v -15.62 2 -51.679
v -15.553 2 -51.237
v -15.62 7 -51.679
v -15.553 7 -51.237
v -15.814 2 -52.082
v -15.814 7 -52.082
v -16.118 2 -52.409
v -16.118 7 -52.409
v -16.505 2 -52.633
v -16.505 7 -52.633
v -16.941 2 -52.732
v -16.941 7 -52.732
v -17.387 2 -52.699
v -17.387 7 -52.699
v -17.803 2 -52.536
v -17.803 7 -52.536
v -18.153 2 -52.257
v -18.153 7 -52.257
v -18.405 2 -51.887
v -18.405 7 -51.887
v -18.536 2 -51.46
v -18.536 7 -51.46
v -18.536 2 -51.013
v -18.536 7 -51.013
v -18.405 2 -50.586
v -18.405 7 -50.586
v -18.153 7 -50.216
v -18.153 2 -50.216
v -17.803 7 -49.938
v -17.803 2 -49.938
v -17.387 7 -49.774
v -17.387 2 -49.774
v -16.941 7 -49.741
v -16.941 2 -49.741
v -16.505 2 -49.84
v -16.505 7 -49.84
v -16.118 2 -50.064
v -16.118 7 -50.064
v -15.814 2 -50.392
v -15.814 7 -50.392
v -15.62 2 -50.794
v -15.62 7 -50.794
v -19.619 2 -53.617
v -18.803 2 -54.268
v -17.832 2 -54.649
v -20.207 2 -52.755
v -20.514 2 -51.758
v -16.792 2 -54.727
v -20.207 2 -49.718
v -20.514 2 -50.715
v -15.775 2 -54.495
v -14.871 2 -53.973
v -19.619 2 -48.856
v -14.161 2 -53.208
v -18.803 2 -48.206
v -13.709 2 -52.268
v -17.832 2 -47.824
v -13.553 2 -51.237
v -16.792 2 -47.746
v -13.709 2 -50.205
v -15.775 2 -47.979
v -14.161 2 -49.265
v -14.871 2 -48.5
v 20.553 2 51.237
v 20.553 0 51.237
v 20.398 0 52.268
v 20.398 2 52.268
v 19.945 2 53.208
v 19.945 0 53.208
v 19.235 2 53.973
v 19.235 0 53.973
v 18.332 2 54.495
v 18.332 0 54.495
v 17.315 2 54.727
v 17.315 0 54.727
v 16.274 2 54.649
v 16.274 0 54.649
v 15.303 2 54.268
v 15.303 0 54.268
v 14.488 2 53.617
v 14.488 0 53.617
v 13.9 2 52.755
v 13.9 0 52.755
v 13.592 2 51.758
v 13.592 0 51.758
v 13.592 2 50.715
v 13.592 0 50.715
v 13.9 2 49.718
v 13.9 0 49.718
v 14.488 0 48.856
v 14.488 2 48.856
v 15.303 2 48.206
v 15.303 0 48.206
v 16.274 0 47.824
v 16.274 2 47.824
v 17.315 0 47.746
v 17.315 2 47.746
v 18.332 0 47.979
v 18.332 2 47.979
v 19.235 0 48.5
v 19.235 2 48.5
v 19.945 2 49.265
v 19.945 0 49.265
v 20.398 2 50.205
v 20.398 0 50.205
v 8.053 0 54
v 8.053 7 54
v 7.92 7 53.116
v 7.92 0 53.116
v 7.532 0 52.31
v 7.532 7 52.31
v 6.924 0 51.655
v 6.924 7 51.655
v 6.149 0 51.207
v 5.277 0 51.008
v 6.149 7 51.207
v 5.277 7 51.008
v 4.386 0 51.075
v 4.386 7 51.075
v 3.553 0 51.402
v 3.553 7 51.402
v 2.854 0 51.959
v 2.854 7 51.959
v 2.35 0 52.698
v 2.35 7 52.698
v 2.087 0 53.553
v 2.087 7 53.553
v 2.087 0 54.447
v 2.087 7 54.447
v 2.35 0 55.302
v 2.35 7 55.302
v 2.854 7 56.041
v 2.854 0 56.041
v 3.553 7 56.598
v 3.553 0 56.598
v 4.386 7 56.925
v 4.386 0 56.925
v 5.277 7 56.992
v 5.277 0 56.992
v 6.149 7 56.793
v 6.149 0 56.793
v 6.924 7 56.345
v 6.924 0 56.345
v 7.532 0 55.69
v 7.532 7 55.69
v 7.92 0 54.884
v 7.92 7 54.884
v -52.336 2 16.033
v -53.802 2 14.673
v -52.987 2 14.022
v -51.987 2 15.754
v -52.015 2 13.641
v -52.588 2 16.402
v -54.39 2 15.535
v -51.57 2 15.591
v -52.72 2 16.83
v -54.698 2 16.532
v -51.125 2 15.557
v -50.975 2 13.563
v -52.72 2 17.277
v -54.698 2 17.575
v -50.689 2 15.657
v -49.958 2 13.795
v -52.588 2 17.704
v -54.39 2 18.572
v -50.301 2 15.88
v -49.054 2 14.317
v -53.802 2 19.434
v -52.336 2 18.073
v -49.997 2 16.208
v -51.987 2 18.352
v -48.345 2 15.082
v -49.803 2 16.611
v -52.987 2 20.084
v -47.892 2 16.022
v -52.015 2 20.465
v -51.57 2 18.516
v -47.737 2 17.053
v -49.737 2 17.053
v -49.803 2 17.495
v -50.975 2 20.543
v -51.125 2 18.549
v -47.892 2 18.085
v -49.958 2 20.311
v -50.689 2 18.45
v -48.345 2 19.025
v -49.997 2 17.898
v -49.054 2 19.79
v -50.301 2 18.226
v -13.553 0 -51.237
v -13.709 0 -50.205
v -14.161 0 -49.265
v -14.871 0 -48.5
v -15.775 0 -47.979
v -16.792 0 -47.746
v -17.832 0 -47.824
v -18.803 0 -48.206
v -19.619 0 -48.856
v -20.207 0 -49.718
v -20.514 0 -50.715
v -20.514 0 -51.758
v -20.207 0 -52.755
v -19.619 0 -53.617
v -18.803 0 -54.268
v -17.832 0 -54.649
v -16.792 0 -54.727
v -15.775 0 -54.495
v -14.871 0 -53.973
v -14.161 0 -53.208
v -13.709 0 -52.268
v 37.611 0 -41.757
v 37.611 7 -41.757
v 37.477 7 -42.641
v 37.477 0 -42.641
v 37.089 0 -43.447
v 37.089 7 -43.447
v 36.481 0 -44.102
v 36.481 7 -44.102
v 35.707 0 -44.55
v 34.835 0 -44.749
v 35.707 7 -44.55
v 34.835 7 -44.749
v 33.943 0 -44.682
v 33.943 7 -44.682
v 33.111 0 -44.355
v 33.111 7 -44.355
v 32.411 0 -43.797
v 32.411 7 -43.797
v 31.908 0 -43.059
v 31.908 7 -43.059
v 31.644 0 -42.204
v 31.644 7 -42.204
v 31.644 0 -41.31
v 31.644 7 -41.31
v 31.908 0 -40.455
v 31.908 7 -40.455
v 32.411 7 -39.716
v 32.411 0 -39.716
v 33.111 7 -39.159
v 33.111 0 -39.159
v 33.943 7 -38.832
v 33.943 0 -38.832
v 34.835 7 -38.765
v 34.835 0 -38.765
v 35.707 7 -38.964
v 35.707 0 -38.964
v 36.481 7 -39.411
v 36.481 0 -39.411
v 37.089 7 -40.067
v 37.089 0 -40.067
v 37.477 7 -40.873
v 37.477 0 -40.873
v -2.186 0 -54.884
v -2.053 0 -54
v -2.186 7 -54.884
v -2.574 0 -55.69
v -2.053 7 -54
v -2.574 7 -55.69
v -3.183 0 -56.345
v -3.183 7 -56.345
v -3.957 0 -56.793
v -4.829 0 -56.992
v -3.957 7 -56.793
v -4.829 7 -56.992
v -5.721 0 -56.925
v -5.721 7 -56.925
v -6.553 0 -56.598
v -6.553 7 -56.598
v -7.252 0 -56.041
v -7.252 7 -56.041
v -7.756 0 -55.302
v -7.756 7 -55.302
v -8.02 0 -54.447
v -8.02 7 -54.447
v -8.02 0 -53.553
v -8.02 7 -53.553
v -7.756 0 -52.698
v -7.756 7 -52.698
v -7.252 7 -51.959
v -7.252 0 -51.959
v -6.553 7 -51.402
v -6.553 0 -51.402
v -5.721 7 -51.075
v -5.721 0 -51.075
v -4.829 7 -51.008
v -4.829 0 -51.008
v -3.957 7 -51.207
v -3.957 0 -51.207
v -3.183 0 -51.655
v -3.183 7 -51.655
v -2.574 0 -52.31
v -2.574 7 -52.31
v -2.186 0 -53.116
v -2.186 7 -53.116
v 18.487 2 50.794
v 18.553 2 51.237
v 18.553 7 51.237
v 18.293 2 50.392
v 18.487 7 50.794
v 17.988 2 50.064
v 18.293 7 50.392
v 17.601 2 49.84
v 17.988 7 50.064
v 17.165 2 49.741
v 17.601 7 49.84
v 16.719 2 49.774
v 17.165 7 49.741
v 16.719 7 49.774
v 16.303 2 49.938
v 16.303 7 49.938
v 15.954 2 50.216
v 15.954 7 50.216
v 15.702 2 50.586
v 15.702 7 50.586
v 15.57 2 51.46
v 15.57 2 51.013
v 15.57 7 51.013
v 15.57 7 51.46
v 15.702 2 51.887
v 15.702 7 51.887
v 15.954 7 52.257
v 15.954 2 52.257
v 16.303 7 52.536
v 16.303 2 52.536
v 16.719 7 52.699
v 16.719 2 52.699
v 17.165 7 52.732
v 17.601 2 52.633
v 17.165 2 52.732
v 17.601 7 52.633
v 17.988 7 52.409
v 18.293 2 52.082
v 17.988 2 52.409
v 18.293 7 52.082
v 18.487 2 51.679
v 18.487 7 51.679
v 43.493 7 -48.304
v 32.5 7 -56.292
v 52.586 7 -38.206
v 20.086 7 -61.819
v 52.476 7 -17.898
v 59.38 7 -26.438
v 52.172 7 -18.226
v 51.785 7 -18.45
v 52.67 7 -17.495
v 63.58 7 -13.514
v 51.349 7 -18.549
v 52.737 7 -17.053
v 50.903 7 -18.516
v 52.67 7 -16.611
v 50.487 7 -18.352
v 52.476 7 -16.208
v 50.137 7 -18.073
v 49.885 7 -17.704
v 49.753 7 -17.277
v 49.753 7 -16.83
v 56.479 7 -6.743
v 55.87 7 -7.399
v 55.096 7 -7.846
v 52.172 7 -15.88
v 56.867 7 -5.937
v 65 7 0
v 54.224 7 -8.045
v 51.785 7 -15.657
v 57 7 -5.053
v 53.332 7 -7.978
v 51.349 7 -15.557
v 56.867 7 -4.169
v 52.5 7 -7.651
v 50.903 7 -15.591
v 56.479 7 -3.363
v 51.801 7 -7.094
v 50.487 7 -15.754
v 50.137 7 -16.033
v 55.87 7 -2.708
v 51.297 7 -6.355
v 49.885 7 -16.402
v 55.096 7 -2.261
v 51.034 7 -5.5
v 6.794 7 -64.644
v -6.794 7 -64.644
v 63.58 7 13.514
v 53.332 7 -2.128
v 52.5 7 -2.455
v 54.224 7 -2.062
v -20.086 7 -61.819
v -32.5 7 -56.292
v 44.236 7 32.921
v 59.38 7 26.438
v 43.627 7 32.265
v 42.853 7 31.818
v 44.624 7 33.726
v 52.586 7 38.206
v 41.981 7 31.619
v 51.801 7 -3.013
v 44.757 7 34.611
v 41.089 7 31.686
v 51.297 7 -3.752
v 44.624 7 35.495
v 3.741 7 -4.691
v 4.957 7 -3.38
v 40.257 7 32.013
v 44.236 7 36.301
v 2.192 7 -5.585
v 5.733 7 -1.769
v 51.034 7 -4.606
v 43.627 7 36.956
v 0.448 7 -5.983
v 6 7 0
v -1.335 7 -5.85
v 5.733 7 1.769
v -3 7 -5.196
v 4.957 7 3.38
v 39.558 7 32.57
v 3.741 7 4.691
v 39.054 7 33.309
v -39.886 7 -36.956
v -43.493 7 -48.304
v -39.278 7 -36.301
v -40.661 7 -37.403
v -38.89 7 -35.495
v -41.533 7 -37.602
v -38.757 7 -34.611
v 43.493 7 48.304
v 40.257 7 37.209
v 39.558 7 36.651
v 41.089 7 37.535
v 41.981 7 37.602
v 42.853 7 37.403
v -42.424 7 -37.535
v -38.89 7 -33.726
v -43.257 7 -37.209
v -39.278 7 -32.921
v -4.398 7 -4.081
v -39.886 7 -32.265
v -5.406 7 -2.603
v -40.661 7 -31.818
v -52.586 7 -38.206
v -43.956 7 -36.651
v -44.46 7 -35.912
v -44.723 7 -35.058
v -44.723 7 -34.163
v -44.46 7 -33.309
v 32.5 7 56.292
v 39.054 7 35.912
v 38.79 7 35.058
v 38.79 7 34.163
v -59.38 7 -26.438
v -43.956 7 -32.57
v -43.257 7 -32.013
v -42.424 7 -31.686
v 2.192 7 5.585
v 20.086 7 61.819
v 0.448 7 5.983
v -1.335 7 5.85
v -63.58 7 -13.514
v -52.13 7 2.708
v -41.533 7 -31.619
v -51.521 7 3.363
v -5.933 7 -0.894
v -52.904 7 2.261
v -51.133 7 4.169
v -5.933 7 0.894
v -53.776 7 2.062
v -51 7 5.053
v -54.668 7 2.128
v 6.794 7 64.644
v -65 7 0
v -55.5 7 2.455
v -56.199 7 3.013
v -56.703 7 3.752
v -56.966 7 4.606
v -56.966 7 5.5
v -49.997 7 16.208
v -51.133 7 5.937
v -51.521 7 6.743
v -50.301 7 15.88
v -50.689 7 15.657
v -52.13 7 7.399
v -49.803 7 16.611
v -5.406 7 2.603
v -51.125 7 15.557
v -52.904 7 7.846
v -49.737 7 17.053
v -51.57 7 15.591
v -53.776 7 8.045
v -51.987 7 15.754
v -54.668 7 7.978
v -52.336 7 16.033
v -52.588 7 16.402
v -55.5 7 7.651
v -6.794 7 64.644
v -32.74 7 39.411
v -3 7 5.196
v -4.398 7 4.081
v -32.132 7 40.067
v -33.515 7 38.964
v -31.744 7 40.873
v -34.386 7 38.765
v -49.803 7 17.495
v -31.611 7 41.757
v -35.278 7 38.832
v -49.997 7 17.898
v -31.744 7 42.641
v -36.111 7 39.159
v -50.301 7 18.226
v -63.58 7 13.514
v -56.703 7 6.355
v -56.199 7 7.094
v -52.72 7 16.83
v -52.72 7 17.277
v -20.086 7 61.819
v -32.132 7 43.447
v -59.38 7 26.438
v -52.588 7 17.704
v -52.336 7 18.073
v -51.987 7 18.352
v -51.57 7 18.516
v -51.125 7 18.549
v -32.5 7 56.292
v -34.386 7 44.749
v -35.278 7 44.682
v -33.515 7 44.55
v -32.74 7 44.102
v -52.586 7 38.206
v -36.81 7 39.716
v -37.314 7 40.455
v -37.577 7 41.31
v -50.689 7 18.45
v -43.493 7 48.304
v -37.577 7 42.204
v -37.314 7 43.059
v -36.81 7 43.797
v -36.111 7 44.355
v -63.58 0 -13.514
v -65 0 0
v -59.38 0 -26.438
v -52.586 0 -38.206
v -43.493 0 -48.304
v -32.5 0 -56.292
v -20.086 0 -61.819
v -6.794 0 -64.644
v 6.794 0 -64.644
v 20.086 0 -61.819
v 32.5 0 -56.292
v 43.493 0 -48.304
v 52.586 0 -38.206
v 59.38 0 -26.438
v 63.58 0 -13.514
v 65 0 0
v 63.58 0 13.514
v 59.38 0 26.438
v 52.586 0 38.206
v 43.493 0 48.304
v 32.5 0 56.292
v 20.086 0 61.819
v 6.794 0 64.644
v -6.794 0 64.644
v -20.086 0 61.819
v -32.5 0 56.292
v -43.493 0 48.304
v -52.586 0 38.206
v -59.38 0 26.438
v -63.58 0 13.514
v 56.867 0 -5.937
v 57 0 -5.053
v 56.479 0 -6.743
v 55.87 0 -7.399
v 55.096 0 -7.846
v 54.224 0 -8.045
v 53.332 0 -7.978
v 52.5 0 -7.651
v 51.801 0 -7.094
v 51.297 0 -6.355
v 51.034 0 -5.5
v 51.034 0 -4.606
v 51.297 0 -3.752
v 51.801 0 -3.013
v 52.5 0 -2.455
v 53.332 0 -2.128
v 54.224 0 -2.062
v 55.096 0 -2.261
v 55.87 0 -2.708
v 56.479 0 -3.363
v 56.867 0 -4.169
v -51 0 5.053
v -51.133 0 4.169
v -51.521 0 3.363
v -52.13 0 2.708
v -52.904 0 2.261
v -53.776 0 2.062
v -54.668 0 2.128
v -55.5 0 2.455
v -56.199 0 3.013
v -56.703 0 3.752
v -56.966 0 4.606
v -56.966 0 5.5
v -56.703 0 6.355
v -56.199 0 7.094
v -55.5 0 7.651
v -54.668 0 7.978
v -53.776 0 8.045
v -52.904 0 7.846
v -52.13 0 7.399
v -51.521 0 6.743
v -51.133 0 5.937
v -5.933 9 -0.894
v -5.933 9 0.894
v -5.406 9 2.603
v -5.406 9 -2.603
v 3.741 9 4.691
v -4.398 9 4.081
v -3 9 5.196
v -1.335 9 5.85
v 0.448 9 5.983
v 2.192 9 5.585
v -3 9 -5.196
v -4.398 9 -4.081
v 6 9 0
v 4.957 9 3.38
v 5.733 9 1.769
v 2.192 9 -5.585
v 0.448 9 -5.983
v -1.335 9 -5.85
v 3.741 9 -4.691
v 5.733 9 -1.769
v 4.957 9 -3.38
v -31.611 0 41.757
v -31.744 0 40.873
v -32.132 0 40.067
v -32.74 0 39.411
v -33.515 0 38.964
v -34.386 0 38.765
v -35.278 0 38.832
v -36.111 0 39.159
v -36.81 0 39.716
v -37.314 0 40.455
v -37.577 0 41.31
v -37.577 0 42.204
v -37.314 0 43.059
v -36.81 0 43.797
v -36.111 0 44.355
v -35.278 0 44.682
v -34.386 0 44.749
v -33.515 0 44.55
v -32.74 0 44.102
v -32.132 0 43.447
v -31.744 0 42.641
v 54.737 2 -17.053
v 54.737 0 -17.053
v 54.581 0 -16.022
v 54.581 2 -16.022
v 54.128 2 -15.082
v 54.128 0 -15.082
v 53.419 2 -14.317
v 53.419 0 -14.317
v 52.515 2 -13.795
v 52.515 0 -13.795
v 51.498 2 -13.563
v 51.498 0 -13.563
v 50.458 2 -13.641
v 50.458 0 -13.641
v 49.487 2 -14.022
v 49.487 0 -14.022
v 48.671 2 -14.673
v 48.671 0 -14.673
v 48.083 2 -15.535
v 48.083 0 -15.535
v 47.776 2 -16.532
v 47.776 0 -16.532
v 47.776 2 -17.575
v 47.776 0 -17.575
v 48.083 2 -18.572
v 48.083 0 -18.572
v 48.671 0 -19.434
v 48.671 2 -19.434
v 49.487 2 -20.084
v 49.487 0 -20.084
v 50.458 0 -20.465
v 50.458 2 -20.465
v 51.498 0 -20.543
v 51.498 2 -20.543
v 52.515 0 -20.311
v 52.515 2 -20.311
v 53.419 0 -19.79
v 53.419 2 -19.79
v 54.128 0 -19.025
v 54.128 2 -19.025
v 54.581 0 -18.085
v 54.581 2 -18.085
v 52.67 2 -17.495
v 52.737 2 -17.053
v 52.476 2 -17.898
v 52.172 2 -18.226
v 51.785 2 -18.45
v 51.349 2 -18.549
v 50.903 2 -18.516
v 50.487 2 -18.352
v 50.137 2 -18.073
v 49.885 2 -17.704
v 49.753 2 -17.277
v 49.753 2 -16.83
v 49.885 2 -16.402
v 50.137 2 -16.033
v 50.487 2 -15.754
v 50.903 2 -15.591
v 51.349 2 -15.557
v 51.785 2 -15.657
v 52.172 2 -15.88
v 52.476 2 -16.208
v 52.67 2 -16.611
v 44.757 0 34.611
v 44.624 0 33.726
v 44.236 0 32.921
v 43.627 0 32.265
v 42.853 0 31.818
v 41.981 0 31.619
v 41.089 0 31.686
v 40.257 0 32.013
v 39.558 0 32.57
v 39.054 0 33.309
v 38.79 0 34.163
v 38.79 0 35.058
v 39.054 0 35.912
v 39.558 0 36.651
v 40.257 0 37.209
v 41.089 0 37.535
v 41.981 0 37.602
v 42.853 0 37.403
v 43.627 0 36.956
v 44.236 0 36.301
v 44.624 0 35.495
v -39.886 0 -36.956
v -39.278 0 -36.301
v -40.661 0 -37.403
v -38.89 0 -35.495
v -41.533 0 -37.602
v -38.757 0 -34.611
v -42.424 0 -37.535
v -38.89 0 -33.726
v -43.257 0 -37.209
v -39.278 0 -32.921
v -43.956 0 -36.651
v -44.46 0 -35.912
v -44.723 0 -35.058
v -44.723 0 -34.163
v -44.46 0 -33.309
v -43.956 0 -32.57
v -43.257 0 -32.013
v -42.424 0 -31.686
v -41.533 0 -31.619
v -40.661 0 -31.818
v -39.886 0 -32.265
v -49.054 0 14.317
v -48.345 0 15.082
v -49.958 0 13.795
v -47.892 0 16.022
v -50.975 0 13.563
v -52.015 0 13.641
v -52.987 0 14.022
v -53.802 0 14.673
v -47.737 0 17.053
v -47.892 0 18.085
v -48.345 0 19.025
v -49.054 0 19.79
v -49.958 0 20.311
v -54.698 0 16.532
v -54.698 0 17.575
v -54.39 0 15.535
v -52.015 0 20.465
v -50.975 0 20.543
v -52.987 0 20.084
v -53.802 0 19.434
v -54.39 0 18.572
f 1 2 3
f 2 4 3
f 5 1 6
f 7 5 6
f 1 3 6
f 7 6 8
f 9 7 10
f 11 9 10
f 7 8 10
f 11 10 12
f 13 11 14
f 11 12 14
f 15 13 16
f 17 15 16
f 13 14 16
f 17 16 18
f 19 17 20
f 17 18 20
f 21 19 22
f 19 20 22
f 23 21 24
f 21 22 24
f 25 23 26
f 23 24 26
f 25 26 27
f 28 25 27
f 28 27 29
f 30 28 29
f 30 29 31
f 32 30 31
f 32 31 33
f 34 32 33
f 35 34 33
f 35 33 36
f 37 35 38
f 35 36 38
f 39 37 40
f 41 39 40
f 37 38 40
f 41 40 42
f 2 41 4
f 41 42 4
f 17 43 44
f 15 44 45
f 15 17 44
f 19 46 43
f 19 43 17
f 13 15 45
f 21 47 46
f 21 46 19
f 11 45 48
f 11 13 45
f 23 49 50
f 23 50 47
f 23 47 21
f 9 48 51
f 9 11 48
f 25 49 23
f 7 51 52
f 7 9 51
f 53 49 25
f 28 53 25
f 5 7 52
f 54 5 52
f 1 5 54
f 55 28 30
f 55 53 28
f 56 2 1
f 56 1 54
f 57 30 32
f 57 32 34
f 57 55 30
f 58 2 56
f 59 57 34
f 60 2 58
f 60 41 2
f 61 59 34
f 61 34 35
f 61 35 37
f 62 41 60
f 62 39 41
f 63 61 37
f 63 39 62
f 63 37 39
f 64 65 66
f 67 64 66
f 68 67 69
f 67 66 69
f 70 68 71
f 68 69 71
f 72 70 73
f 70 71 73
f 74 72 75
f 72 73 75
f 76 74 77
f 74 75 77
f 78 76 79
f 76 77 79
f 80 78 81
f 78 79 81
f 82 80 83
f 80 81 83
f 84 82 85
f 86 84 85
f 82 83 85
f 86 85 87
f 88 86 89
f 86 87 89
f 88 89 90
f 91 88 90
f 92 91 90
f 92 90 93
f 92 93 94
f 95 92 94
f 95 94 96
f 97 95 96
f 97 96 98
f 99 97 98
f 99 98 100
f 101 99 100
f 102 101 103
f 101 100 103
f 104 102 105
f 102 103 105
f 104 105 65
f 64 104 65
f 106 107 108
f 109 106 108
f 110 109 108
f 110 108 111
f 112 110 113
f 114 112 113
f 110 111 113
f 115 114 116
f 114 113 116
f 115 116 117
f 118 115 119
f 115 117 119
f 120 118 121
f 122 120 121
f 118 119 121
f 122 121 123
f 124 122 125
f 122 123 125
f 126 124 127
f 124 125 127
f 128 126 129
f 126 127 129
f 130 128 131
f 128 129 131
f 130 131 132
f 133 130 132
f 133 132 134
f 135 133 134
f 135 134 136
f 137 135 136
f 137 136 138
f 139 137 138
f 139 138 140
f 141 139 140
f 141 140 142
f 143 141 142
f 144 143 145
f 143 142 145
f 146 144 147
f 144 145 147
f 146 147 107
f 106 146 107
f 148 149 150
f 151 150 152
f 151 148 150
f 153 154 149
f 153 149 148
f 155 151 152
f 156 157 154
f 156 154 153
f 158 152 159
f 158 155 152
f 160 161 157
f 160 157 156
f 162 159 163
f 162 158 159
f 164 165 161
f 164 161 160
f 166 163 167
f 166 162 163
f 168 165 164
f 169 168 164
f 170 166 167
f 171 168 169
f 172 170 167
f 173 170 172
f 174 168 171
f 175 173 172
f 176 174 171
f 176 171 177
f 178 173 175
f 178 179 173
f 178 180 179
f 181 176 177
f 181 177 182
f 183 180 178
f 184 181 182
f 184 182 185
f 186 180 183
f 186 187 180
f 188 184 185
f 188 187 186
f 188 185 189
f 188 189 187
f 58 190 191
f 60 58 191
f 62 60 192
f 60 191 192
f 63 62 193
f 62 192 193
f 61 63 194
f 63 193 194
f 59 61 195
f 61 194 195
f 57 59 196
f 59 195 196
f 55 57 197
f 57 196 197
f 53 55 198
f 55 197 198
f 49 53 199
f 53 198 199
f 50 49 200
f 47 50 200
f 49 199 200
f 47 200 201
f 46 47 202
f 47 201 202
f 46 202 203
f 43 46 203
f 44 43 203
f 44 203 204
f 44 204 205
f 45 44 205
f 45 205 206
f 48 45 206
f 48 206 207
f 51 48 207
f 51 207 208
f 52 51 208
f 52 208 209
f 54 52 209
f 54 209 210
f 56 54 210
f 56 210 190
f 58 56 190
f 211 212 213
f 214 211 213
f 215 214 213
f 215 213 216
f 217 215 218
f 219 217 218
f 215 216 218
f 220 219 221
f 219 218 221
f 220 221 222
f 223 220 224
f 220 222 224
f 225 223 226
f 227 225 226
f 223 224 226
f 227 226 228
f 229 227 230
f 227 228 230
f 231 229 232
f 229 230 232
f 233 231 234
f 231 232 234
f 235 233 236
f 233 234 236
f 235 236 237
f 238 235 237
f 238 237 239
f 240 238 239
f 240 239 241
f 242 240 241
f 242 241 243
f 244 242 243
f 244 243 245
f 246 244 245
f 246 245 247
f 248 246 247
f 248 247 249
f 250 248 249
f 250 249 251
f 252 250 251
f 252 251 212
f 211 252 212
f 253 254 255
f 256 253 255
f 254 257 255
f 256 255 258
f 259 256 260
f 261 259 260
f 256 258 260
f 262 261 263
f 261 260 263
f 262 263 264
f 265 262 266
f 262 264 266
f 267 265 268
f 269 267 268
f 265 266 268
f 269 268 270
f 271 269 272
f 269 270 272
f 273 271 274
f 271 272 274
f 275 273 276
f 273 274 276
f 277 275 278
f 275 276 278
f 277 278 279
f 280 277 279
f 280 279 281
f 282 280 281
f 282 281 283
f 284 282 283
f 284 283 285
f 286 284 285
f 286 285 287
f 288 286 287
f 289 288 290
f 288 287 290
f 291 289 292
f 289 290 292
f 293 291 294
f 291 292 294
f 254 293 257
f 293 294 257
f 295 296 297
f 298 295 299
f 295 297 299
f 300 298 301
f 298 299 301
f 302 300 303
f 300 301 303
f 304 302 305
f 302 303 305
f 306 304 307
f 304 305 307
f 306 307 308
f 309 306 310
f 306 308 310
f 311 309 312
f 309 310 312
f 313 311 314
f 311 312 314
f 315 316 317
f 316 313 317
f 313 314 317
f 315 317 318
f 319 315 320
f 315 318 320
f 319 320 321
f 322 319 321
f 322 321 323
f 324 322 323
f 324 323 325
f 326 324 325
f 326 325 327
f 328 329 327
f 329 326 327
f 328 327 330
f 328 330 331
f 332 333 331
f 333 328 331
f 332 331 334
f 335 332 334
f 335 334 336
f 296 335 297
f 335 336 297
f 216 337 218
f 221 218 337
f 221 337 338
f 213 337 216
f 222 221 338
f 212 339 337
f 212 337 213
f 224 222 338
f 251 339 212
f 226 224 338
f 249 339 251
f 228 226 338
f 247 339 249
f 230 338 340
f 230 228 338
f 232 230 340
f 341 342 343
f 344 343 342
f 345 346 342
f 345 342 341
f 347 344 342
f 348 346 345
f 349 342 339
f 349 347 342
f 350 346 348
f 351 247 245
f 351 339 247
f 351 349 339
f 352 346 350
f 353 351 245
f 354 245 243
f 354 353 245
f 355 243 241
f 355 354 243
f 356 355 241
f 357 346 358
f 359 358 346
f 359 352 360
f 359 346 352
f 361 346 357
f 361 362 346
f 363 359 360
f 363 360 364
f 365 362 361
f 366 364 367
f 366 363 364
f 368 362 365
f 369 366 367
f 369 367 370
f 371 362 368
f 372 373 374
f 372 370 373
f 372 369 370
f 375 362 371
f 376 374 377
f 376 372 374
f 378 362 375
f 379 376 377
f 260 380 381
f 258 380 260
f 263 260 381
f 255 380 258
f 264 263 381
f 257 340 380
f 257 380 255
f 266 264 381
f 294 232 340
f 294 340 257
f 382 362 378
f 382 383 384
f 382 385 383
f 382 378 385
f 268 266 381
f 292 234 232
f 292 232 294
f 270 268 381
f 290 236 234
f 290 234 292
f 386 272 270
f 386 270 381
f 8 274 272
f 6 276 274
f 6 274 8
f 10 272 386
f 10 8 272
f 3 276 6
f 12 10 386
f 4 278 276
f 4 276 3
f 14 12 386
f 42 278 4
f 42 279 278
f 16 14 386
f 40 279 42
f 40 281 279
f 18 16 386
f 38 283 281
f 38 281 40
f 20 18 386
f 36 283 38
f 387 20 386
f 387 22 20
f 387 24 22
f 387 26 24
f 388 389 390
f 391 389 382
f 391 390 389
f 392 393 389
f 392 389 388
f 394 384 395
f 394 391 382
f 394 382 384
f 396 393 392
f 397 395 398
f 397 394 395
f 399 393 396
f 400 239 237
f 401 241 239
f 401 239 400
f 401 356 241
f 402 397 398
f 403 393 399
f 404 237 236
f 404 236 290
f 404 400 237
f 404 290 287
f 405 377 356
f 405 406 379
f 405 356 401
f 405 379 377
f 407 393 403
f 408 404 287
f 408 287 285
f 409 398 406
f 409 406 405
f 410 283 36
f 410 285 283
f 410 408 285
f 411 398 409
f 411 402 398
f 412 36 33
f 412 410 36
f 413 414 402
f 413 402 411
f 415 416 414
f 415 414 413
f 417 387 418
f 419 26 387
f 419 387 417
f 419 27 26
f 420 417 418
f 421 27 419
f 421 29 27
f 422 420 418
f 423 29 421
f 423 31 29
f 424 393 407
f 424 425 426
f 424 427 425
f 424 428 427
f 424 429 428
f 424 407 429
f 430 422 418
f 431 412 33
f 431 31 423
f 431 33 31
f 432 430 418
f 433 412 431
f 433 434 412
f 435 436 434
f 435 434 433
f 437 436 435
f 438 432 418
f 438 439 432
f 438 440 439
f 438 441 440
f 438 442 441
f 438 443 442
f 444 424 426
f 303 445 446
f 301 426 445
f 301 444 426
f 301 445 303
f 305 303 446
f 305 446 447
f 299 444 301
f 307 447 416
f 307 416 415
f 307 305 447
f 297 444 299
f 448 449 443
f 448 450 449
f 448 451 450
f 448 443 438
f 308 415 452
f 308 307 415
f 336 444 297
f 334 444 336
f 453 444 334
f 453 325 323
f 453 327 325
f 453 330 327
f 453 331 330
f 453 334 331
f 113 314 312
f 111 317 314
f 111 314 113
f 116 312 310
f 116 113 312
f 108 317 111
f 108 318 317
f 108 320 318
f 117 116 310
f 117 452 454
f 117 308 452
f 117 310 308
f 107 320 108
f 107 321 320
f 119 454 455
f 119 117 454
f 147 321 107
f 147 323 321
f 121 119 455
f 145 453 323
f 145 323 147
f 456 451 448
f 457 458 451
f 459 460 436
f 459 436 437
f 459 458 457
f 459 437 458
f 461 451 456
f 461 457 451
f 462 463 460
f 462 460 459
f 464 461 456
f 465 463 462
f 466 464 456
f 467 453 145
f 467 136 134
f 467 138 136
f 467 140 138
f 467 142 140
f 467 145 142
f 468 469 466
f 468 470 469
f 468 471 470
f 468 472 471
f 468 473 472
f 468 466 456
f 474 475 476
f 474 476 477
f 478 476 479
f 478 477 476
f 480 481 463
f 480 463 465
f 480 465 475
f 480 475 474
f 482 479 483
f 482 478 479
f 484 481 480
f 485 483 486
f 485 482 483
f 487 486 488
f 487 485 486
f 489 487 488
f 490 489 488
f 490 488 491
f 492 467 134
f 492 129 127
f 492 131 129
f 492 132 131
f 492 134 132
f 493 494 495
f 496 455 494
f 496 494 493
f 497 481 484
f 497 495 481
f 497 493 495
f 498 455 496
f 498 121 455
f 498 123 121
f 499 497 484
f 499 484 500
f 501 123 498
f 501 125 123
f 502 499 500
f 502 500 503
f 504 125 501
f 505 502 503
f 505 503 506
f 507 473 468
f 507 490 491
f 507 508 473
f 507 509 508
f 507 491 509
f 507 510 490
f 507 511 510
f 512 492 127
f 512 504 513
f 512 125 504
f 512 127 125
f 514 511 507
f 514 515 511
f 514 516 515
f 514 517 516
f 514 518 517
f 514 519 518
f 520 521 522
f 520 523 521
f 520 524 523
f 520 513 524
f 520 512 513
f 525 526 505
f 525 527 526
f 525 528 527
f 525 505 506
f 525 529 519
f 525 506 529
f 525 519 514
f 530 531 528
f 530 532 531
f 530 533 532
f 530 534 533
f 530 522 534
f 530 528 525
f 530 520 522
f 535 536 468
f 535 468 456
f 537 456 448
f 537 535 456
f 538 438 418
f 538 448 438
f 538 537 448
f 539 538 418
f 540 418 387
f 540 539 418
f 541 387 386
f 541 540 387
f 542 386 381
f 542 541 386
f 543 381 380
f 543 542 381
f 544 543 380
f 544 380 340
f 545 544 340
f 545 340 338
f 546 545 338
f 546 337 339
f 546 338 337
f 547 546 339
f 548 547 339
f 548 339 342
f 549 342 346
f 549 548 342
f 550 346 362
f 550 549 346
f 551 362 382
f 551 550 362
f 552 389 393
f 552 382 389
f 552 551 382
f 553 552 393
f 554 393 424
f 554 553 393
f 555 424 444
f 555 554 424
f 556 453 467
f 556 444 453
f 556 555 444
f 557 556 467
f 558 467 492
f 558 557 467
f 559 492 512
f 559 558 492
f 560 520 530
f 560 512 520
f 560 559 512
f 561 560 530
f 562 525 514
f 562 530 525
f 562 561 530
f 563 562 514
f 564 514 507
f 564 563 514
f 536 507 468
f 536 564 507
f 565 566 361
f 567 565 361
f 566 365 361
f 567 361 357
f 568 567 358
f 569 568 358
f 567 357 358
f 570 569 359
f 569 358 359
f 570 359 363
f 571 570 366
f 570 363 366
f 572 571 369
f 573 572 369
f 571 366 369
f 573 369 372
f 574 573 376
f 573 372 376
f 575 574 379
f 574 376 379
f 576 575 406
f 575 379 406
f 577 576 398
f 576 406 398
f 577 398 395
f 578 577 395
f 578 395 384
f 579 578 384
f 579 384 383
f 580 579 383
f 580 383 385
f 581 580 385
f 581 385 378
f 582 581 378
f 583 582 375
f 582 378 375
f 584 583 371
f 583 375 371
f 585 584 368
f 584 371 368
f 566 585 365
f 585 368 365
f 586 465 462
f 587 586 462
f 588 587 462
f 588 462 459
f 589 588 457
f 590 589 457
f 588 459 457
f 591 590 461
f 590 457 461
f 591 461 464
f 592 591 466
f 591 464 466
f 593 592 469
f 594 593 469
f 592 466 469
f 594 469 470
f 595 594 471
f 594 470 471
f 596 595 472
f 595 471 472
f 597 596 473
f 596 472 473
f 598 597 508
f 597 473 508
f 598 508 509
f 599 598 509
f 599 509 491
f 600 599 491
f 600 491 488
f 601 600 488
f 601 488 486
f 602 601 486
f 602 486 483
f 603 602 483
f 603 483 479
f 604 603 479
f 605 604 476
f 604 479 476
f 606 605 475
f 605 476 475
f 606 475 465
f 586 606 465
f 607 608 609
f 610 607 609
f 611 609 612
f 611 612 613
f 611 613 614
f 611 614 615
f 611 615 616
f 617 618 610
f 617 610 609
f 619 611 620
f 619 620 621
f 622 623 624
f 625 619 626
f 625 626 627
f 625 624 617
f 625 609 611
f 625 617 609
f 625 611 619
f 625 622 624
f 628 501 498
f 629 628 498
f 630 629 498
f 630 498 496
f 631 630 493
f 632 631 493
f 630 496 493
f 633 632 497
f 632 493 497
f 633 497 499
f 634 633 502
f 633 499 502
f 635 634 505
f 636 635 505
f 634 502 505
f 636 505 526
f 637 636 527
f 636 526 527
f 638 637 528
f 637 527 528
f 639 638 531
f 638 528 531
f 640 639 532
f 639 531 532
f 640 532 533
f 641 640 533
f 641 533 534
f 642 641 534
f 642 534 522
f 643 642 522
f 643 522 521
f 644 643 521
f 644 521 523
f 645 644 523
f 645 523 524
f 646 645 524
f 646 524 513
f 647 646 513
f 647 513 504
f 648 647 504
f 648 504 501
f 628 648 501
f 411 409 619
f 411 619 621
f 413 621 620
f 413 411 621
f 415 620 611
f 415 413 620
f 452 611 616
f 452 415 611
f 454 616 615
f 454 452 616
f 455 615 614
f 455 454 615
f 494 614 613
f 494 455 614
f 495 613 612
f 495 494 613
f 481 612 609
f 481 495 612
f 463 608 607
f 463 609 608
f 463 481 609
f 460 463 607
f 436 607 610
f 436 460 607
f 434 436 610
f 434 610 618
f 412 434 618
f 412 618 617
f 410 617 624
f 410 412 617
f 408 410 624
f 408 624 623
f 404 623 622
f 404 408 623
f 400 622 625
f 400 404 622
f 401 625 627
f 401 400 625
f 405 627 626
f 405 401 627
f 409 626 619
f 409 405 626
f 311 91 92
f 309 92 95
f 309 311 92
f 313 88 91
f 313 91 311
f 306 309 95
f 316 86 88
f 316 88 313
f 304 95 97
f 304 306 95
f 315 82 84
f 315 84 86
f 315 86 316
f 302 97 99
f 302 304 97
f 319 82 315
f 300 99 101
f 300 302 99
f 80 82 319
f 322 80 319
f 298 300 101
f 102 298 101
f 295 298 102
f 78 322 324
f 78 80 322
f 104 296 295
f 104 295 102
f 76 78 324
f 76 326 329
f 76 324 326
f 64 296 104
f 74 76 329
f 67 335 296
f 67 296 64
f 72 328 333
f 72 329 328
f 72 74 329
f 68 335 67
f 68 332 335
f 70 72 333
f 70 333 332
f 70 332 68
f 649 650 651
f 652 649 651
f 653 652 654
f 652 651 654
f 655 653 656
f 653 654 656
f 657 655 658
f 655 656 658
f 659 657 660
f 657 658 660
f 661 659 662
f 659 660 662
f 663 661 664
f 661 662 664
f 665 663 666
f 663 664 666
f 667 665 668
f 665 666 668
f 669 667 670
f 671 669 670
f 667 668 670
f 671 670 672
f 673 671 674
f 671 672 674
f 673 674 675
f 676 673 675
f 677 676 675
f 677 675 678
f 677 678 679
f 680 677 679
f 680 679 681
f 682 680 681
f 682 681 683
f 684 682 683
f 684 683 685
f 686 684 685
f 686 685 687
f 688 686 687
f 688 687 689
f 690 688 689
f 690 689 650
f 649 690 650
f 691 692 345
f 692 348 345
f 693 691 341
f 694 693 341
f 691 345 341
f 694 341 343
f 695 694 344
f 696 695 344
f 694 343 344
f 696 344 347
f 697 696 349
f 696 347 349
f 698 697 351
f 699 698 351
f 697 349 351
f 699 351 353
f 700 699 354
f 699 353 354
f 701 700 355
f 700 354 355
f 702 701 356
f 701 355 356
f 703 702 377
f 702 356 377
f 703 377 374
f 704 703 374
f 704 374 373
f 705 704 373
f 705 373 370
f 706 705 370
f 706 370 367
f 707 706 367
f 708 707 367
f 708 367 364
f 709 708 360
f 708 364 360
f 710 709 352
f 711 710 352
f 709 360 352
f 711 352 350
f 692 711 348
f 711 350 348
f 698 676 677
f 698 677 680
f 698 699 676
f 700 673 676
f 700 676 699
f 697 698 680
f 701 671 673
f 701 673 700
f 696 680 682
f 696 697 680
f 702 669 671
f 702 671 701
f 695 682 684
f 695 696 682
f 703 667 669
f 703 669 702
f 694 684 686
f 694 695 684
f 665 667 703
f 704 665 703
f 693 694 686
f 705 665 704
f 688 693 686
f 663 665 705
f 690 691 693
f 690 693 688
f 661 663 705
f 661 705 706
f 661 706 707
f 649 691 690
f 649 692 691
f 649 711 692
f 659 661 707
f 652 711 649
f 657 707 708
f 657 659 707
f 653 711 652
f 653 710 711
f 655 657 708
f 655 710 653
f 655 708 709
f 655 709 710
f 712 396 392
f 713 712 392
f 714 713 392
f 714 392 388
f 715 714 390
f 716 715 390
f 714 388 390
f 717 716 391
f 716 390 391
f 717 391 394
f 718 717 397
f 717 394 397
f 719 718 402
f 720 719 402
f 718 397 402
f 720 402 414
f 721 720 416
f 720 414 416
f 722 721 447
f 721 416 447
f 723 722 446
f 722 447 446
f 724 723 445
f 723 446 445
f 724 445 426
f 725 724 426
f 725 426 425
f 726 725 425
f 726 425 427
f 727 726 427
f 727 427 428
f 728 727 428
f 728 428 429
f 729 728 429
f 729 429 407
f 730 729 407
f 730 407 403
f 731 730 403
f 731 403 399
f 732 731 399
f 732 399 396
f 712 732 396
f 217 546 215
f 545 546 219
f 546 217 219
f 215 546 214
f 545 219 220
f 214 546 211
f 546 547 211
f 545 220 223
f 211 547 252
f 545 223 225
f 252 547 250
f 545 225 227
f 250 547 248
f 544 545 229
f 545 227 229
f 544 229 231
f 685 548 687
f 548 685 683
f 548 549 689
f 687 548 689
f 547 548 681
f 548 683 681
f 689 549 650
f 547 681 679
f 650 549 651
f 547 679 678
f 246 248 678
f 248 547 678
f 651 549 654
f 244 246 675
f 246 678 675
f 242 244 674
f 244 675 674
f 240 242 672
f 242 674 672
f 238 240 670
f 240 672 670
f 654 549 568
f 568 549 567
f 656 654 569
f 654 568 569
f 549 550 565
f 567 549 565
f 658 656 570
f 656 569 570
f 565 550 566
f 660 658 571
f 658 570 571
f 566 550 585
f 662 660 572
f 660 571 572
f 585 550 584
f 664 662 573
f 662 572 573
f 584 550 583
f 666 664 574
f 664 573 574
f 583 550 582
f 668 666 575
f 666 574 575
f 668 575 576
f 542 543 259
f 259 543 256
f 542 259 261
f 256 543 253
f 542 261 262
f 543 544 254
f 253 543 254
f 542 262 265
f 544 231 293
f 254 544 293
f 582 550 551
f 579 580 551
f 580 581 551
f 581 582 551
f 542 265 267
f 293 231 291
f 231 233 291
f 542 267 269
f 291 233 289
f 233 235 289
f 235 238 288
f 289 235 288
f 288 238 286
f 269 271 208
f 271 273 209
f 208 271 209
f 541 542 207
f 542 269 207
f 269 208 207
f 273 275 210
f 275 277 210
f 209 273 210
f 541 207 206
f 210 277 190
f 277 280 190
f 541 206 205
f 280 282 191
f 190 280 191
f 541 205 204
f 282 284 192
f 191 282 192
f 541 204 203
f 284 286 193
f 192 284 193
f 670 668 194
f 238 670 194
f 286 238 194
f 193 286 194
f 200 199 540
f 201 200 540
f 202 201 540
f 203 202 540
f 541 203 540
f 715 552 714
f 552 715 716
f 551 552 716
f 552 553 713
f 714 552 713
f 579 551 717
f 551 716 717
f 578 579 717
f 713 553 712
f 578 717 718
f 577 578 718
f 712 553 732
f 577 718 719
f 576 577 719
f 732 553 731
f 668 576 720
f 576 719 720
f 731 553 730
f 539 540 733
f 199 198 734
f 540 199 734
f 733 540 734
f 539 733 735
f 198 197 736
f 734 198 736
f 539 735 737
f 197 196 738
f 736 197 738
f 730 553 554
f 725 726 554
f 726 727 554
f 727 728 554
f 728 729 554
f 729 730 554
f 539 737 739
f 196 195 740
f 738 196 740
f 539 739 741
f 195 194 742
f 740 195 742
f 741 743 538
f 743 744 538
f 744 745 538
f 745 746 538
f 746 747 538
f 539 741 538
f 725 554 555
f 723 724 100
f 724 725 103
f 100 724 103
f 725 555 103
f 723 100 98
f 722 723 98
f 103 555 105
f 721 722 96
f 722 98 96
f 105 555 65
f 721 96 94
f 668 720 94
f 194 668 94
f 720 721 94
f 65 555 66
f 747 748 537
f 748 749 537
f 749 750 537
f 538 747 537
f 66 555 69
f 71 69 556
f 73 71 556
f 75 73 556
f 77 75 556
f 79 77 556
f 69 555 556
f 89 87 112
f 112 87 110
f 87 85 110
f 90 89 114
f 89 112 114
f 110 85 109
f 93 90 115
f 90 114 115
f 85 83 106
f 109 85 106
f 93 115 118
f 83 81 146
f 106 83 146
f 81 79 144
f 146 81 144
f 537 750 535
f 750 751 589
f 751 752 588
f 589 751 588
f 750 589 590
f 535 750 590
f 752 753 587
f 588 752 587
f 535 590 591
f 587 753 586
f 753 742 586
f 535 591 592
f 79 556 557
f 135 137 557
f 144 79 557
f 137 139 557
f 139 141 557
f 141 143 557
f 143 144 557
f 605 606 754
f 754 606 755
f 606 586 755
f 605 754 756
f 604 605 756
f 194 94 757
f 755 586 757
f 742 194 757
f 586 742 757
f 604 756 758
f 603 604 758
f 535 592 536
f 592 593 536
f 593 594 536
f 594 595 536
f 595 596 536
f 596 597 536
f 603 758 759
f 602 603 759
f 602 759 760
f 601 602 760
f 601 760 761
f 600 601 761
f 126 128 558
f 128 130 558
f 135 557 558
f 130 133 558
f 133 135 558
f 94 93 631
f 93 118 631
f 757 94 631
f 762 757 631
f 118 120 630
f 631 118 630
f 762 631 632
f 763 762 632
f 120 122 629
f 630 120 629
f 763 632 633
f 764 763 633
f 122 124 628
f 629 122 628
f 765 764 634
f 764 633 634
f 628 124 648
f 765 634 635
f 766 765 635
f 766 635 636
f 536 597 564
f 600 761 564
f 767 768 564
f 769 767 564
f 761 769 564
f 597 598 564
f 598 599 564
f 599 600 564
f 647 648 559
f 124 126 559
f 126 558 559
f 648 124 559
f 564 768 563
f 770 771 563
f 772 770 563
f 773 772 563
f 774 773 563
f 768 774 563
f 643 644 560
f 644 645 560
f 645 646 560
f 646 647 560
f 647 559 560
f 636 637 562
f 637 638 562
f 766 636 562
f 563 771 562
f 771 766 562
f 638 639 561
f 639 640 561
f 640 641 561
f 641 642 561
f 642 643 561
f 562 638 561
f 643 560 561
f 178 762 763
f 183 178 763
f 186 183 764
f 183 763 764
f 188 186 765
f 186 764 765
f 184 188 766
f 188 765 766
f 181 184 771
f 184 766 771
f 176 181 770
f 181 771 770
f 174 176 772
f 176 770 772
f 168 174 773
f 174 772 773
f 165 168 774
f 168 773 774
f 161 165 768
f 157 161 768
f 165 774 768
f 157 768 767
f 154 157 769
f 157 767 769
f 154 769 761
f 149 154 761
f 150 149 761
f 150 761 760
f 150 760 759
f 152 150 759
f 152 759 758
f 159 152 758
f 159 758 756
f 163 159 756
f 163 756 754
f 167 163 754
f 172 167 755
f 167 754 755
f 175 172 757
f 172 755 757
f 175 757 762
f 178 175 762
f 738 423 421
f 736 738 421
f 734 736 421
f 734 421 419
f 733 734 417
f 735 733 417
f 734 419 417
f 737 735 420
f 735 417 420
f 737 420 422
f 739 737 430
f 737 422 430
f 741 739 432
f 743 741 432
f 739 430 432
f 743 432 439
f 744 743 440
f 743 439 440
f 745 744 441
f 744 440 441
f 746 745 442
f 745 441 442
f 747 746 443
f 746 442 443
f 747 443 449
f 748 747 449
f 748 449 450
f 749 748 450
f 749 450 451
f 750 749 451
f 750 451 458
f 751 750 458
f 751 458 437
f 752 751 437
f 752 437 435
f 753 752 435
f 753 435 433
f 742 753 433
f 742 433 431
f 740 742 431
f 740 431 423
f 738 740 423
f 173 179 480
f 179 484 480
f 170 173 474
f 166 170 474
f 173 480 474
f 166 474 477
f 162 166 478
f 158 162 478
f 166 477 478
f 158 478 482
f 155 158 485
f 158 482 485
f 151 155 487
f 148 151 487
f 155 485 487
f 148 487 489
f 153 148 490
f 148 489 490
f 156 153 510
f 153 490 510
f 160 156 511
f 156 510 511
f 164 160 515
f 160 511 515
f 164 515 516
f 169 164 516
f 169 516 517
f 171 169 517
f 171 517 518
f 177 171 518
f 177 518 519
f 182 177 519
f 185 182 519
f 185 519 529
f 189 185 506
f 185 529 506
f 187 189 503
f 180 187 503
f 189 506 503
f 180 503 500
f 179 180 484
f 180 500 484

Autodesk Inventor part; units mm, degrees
ref_plane "YZ Plane" through (0, 0, 0) normal (1, 0, 0) x (0, 1, 0)
ref_plane "XZ Plane" through (0, 0, 0) normal (0, 1, 0) x (-1, 0, 0)
ref_plane "XY Plane" through (0, 0, 0) normal (0, 0, 1) x (1, 0, 0)
sketch "Sketch1" plane through (0, 0, 0) normal (0, 1, 0) x (-1, 0, 0)
  circle A0 centre (0, 0) radius 65
  dimension "d0" = 130
extrude "Extrusion1" add sketch "Sketch1" along normal blind 7
sketch "Sketch2" plane through (0, 7, 0) normal (0, 1, 0) x (1, 0, 0)
  circle A0 centre (-54, -5.0532) radius 3
  circle A1 centre (-34.6106, -41.7569) radius 3
  circle A2 centre (5.0532, -54) radius 3
  circle A3 centre (41.7569, -34.6106) radius 3
  circle A4 centre (54, 5.0532) radius 3
  circle A5 centre (34.6106, 41.7569) radius 3
  circle A6 centre (-5.0532, 54) radius 3
  circle A7 centre (-41.7569, 34.6106) radius 3
  point P0 (0, 0)
  dimension "d3" = 6
  dimension "d4" = 54
  dimension "d7" = 360
extrude "Extrusion2" cut sketch "Sketch2" against normal through all
sketch "Sketch3" plane through (0, 7, 0) normal (0, 1, 0) x (1, 0, 0)
  circle A0 centre (-51.2366, -17.0532) radius 1.5
  circle A1 centre (-54, -5.0532) radius 3 projected
  circle A2 centre (17.0532, -51.2366) radius 1.5
  circle A3 centre (51.2366, 17.0532) radius 1.5
  circle A4 centre (-17.0532, 51.2366) radius 1.5
  circle A5 centre (-34.6106, -41.7569) radius 3 projected
  point P0 (0, 0)
  dimension "d13" = 3
  dimension "d16" = 360
  dimension "d31" = 12
  dimension "d33" = 54
extrude "Extrusion3" cut sketch "Sketch3" against normal through all contours A0 | A2 | A3 | A4
sketch "Sketch4" plane through (0, 0, 0) normal (0, -1, 0) x (1, 0, 0)
  circle A0 centre (17.0532, 51.2366) radius 3.5
  circle A1 centre (17.0532, 51.2366) radius 1.5 projected
  circle A2 centre (-51.2366, 17.0532) radius 3.5
  circle A3 centre (-17.0532, -51.2366) radius 3.5
  circle A4 centre (51.2366, -17.0532) radius 3.5
  point P0 (0, 0)
  dimension "d20" = 7
  dimension "d23" = 360
extrude "Extrusion4" cut sketch "Sketch4" against normal blind 2
sketch "Sketch5" plane through (0, 7, 0) normal (0, 1, 0) x (1, 0, 0)
  circle A0 centre (0, 0) radius 6
  dimension "d27" = 12
extrude "Extrusion5" add sketch "Sketch5" along normal blind 2
properties part number "bay container 8 bottom"
